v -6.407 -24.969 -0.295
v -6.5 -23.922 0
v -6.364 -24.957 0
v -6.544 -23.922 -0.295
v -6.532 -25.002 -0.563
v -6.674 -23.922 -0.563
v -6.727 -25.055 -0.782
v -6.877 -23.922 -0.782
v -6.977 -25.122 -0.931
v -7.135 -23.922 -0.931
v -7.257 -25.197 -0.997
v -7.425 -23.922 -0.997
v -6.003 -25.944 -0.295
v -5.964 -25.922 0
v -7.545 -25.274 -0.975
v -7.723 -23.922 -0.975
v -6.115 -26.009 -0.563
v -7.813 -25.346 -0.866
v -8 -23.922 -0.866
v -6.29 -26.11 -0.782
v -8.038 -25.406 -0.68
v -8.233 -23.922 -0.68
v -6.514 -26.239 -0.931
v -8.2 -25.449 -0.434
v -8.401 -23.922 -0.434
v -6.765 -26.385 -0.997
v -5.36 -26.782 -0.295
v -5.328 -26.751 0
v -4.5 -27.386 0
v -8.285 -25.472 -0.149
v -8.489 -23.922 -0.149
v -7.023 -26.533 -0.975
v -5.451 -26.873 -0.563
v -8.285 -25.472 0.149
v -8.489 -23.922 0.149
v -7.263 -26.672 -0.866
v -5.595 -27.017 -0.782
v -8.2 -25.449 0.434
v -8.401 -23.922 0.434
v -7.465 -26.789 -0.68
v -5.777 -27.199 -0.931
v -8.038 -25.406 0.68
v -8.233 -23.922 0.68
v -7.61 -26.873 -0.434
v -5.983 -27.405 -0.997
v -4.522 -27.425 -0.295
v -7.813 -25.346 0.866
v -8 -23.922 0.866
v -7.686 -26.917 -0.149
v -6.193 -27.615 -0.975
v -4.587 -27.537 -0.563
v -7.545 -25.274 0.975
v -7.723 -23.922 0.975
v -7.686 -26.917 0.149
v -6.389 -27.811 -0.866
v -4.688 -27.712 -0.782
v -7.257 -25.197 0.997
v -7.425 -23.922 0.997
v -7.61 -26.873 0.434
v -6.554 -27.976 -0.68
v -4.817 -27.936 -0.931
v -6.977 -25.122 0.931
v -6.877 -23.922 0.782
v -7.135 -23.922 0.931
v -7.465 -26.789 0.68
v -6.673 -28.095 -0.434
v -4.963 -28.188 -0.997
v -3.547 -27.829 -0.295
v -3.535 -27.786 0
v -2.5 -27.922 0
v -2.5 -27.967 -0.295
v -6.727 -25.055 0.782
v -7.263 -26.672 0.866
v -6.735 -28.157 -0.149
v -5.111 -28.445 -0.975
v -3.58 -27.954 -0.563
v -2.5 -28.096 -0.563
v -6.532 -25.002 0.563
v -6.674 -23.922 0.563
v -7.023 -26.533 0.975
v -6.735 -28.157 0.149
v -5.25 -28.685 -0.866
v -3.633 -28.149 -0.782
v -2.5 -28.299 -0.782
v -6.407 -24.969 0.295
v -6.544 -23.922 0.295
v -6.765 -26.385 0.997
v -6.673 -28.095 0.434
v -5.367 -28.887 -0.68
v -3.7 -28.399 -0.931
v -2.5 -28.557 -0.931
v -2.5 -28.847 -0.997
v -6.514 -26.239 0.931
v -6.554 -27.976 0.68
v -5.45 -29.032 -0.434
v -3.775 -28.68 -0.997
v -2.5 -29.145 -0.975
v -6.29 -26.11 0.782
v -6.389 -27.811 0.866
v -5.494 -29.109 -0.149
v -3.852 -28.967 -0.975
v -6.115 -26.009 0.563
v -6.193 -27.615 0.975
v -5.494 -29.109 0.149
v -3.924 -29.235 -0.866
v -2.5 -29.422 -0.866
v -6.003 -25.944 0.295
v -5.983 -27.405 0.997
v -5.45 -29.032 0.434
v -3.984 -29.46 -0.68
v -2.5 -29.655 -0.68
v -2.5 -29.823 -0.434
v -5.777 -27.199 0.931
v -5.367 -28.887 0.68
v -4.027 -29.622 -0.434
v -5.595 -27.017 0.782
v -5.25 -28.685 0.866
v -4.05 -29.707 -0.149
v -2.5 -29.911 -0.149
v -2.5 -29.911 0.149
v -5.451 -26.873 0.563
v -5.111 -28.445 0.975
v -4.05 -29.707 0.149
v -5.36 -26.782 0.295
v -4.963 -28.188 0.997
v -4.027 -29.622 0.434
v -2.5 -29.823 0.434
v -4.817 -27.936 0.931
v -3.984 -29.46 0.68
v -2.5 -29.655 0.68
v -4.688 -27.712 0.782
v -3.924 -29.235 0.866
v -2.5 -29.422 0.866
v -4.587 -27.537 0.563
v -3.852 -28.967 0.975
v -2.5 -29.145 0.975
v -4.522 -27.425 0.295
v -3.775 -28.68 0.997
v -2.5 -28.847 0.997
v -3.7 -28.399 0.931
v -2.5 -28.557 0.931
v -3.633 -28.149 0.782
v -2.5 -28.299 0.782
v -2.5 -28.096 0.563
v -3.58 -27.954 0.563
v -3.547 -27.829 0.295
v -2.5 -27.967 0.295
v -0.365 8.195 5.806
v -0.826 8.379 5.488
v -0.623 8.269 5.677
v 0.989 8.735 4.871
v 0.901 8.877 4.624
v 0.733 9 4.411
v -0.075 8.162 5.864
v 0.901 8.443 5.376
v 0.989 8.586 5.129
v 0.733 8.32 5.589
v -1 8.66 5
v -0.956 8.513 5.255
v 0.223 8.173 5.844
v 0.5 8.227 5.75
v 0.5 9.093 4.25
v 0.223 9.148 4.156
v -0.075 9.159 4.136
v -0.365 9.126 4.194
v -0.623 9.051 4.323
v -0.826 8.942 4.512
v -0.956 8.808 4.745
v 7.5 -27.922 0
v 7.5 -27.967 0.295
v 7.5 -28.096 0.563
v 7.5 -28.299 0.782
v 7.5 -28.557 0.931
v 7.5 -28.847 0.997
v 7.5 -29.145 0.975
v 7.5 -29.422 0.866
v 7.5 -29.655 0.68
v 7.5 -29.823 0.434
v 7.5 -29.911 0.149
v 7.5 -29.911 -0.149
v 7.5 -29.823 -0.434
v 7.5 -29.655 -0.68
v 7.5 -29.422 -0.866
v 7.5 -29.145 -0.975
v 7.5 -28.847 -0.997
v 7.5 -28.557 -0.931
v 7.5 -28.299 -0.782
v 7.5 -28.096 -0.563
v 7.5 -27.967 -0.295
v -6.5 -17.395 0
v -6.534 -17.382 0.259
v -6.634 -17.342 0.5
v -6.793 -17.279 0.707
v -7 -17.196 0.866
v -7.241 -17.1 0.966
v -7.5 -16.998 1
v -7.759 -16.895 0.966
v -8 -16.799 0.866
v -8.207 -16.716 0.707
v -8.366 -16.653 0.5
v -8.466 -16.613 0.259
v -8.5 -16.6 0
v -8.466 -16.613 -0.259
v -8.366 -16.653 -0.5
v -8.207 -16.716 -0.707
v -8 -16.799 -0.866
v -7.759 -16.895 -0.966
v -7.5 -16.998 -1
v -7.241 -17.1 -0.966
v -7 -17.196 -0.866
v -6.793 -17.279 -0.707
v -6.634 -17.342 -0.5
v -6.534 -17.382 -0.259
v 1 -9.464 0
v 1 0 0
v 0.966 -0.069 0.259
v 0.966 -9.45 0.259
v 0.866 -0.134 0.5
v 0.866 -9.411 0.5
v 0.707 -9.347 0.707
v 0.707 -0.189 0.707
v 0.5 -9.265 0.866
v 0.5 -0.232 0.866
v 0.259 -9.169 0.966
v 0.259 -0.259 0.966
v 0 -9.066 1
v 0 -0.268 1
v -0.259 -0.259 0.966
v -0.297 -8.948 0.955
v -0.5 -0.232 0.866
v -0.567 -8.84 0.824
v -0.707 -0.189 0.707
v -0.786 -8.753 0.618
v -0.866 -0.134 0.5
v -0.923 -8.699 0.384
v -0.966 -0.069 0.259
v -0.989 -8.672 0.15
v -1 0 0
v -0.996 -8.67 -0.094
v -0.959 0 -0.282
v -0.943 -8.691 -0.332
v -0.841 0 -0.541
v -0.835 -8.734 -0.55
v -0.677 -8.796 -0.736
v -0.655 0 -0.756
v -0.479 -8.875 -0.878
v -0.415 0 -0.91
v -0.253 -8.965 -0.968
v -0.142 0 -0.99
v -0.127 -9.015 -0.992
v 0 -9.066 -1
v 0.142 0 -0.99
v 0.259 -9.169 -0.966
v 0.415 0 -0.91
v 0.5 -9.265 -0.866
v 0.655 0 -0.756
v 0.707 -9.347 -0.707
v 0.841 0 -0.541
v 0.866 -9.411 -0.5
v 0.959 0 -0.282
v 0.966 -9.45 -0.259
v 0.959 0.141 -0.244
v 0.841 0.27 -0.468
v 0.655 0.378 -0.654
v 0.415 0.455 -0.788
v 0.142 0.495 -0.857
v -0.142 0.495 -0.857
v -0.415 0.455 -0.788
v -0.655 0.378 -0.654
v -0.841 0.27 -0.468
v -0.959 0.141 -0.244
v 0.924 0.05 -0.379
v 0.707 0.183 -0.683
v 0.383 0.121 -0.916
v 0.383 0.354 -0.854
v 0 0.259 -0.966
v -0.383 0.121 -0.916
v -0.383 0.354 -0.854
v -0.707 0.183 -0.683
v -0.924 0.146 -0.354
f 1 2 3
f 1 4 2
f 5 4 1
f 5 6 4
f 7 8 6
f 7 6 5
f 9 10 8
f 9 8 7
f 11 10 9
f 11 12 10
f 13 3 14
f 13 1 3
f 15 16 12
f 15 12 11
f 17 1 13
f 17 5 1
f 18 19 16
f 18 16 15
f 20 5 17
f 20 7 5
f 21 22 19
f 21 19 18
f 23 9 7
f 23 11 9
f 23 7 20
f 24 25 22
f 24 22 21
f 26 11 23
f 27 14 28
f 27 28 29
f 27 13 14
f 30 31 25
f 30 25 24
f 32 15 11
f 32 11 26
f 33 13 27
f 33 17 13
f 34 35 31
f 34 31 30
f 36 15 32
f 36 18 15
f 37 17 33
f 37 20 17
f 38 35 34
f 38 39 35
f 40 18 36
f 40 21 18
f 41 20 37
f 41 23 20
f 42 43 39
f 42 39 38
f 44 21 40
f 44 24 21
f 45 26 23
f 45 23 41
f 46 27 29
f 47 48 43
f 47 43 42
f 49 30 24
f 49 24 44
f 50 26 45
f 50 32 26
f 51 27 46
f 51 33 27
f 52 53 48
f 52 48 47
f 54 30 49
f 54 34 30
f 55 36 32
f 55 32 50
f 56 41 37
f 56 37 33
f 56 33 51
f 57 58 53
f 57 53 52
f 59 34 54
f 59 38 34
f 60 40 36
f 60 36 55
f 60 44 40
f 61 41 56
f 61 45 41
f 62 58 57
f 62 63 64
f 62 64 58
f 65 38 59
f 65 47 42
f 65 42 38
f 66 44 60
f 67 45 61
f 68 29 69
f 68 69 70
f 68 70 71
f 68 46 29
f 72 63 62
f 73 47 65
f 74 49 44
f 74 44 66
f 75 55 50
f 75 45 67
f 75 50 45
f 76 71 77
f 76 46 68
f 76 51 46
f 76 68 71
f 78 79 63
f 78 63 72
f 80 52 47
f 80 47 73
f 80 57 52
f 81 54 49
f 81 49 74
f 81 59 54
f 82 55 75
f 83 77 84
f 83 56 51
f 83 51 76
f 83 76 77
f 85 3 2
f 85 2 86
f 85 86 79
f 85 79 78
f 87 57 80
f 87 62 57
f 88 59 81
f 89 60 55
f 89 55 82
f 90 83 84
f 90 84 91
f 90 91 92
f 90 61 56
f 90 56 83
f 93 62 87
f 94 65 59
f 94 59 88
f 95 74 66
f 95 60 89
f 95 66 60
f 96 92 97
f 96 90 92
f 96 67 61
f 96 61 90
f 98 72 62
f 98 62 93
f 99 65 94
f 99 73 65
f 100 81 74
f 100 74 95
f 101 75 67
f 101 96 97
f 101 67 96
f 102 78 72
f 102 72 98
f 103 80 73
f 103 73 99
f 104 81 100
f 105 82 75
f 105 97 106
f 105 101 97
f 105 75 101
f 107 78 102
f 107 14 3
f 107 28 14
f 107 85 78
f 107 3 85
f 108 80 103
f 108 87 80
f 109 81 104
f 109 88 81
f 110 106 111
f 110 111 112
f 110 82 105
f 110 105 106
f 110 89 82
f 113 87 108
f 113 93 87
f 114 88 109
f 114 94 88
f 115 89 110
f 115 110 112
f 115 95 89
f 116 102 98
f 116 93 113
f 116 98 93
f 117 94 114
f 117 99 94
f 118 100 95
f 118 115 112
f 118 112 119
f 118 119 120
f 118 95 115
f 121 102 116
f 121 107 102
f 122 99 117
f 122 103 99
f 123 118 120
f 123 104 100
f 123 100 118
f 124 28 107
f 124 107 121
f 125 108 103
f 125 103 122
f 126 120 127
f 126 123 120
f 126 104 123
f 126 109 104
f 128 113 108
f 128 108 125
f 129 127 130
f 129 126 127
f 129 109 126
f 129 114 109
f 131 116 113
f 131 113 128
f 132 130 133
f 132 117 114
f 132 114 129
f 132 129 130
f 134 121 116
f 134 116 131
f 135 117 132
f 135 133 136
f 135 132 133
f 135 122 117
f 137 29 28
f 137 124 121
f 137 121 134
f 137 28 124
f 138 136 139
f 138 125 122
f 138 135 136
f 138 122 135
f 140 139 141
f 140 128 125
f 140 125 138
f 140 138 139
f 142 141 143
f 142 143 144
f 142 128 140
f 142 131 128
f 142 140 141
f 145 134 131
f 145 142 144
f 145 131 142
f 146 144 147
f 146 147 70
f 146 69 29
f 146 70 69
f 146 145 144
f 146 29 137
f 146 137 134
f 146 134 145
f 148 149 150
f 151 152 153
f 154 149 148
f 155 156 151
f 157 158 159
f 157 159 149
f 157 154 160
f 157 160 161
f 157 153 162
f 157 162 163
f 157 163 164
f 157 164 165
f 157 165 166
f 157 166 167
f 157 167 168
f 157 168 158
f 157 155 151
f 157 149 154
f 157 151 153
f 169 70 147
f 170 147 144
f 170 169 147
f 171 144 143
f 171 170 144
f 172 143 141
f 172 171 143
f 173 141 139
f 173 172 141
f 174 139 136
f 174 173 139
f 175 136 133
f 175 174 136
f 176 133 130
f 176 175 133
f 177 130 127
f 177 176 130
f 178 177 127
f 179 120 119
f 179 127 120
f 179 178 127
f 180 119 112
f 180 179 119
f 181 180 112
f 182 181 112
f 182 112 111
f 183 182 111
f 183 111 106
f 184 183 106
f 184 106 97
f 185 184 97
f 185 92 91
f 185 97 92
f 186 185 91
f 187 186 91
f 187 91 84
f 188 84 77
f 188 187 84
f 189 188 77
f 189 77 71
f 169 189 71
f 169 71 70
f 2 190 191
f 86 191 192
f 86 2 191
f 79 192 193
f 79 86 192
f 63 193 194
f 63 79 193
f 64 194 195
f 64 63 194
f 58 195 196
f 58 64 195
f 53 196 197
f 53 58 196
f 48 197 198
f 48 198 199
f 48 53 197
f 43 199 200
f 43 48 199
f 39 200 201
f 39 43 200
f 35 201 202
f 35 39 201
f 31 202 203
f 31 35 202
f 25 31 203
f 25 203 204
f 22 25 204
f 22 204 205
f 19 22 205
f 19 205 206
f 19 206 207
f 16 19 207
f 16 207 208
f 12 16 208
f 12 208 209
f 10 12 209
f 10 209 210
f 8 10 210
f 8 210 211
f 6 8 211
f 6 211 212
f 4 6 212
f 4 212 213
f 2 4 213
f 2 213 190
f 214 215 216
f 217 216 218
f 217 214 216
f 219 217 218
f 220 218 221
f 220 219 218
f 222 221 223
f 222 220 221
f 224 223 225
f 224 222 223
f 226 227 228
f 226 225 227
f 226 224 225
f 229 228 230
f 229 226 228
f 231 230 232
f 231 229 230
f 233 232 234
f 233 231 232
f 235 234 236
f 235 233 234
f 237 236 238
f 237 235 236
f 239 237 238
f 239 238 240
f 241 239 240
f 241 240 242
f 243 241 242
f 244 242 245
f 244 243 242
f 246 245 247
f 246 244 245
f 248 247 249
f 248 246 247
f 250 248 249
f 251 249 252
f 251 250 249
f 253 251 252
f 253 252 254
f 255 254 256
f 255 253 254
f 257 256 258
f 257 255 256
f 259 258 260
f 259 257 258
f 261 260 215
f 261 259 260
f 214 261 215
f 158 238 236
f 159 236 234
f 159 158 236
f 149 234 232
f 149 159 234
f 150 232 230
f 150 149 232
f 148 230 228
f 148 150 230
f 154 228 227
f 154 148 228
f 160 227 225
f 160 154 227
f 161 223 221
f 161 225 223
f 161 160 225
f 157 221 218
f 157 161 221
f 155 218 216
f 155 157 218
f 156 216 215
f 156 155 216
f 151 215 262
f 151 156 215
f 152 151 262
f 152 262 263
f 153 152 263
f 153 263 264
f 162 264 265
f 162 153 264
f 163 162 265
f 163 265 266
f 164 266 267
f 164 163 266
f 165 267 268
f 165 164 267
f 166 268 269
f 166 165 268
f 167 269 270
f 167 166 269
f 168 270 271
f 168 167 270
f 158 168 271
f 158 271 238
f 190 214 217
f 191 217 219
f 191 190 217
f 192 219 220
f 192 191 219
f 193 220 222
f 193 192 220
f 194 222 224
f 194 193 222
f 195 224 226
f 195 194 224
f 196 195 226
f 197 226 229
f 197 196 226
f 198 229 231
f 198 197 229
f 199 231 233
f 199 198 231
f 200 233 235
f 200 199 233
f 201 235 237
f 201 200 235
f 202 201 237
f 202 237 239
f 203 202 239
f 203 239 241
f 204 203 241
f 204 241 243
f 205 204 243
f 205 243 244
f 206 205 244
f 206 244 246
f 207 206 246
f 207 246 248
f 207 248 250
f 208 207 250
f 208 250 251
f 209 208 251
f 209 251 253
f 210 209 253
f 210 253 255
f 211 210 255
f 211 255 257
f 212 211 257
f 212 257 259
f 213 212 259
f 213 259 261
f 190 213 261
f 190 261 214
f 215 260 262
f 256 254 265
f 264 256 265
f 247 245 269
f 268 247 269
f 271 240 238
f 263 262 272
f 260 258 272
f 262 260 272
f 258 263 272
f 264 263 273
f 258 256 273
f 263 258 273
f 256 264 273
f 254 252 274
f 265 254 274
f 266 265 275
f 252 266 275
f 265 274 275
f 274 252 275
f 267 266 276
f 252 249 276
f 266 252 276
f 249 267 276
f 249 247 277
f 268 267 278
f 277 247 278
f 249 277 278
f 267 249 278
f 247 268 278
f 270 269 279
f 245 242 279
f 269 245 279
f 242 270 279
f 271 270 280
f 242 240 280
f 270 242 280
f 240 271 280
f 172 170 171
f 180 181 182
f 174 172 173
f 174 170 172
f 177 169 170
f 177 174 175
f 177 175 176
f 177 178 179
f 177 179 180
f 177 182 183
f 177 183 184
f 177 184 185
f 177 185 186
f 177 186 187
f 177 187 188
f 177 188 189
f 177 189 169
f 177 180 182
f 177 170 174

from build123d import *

# Parameters (mm, degrees)
F1_R     = 1
F5_R     = 1
F9_ANGLE = 30


with BuildPart() as f2:
    # F2: sweep along a path in F0
    with BuildLine(Plane.XY) as f2_path:
        Line((0, 0), (0, -9.0658888221))
        Line((0, -9.0658888221), (-7.5, -16.9975012541))
        Line((-7.5, -16.9975012541), (-7.5, -23.9220938832))
        ThreePointArc((-7.5, -23.9220938832), (-6.0355339059, -27.4576277891), (-2.5, -28.9220938832))
        Line((-2.5, -28.9220938832), (7.5, -28.9220938832))
    # F1 (on Front) → F2 (sweep)
    with BuildSketch(Plane.XZ):
        Circle(F1_R)
    sweep(path=f2_path.line, transition=Transition.RIGHT)

    # F8: sweep along a path in F7
    with BuildLine(Plane.YZ) as f8_path:
        Line((0, 0), (8.6602540378, 5))
    # F5 (on line) → F8 (sweep)
    with BuildSketch(Plane(origin=(0, 0, 0), x_dir=(-1, 0, 0), z_dir=(0, 0.8660254038, 0.5))):
        Circle(F5_R)
    sweep(path=f8_path.line)

    # F3 (on face) → F9 (revolve)
    with BuildSketch(Plane(origin=(0, 0, 0), x_dir=(-1, 0, 0), z_dir=(0, 1, 0))):
        with BuildLine():
            ThreePointArc((-1, 0), (0, -1), (1, 0))
            Line((1, 0), (-1, 0))
        make_face()
    revolve(axis=Axis((0, 0, 0), (1, 0, 0)), revolution_arc=F9_ANGLE)


solid = f2.part
